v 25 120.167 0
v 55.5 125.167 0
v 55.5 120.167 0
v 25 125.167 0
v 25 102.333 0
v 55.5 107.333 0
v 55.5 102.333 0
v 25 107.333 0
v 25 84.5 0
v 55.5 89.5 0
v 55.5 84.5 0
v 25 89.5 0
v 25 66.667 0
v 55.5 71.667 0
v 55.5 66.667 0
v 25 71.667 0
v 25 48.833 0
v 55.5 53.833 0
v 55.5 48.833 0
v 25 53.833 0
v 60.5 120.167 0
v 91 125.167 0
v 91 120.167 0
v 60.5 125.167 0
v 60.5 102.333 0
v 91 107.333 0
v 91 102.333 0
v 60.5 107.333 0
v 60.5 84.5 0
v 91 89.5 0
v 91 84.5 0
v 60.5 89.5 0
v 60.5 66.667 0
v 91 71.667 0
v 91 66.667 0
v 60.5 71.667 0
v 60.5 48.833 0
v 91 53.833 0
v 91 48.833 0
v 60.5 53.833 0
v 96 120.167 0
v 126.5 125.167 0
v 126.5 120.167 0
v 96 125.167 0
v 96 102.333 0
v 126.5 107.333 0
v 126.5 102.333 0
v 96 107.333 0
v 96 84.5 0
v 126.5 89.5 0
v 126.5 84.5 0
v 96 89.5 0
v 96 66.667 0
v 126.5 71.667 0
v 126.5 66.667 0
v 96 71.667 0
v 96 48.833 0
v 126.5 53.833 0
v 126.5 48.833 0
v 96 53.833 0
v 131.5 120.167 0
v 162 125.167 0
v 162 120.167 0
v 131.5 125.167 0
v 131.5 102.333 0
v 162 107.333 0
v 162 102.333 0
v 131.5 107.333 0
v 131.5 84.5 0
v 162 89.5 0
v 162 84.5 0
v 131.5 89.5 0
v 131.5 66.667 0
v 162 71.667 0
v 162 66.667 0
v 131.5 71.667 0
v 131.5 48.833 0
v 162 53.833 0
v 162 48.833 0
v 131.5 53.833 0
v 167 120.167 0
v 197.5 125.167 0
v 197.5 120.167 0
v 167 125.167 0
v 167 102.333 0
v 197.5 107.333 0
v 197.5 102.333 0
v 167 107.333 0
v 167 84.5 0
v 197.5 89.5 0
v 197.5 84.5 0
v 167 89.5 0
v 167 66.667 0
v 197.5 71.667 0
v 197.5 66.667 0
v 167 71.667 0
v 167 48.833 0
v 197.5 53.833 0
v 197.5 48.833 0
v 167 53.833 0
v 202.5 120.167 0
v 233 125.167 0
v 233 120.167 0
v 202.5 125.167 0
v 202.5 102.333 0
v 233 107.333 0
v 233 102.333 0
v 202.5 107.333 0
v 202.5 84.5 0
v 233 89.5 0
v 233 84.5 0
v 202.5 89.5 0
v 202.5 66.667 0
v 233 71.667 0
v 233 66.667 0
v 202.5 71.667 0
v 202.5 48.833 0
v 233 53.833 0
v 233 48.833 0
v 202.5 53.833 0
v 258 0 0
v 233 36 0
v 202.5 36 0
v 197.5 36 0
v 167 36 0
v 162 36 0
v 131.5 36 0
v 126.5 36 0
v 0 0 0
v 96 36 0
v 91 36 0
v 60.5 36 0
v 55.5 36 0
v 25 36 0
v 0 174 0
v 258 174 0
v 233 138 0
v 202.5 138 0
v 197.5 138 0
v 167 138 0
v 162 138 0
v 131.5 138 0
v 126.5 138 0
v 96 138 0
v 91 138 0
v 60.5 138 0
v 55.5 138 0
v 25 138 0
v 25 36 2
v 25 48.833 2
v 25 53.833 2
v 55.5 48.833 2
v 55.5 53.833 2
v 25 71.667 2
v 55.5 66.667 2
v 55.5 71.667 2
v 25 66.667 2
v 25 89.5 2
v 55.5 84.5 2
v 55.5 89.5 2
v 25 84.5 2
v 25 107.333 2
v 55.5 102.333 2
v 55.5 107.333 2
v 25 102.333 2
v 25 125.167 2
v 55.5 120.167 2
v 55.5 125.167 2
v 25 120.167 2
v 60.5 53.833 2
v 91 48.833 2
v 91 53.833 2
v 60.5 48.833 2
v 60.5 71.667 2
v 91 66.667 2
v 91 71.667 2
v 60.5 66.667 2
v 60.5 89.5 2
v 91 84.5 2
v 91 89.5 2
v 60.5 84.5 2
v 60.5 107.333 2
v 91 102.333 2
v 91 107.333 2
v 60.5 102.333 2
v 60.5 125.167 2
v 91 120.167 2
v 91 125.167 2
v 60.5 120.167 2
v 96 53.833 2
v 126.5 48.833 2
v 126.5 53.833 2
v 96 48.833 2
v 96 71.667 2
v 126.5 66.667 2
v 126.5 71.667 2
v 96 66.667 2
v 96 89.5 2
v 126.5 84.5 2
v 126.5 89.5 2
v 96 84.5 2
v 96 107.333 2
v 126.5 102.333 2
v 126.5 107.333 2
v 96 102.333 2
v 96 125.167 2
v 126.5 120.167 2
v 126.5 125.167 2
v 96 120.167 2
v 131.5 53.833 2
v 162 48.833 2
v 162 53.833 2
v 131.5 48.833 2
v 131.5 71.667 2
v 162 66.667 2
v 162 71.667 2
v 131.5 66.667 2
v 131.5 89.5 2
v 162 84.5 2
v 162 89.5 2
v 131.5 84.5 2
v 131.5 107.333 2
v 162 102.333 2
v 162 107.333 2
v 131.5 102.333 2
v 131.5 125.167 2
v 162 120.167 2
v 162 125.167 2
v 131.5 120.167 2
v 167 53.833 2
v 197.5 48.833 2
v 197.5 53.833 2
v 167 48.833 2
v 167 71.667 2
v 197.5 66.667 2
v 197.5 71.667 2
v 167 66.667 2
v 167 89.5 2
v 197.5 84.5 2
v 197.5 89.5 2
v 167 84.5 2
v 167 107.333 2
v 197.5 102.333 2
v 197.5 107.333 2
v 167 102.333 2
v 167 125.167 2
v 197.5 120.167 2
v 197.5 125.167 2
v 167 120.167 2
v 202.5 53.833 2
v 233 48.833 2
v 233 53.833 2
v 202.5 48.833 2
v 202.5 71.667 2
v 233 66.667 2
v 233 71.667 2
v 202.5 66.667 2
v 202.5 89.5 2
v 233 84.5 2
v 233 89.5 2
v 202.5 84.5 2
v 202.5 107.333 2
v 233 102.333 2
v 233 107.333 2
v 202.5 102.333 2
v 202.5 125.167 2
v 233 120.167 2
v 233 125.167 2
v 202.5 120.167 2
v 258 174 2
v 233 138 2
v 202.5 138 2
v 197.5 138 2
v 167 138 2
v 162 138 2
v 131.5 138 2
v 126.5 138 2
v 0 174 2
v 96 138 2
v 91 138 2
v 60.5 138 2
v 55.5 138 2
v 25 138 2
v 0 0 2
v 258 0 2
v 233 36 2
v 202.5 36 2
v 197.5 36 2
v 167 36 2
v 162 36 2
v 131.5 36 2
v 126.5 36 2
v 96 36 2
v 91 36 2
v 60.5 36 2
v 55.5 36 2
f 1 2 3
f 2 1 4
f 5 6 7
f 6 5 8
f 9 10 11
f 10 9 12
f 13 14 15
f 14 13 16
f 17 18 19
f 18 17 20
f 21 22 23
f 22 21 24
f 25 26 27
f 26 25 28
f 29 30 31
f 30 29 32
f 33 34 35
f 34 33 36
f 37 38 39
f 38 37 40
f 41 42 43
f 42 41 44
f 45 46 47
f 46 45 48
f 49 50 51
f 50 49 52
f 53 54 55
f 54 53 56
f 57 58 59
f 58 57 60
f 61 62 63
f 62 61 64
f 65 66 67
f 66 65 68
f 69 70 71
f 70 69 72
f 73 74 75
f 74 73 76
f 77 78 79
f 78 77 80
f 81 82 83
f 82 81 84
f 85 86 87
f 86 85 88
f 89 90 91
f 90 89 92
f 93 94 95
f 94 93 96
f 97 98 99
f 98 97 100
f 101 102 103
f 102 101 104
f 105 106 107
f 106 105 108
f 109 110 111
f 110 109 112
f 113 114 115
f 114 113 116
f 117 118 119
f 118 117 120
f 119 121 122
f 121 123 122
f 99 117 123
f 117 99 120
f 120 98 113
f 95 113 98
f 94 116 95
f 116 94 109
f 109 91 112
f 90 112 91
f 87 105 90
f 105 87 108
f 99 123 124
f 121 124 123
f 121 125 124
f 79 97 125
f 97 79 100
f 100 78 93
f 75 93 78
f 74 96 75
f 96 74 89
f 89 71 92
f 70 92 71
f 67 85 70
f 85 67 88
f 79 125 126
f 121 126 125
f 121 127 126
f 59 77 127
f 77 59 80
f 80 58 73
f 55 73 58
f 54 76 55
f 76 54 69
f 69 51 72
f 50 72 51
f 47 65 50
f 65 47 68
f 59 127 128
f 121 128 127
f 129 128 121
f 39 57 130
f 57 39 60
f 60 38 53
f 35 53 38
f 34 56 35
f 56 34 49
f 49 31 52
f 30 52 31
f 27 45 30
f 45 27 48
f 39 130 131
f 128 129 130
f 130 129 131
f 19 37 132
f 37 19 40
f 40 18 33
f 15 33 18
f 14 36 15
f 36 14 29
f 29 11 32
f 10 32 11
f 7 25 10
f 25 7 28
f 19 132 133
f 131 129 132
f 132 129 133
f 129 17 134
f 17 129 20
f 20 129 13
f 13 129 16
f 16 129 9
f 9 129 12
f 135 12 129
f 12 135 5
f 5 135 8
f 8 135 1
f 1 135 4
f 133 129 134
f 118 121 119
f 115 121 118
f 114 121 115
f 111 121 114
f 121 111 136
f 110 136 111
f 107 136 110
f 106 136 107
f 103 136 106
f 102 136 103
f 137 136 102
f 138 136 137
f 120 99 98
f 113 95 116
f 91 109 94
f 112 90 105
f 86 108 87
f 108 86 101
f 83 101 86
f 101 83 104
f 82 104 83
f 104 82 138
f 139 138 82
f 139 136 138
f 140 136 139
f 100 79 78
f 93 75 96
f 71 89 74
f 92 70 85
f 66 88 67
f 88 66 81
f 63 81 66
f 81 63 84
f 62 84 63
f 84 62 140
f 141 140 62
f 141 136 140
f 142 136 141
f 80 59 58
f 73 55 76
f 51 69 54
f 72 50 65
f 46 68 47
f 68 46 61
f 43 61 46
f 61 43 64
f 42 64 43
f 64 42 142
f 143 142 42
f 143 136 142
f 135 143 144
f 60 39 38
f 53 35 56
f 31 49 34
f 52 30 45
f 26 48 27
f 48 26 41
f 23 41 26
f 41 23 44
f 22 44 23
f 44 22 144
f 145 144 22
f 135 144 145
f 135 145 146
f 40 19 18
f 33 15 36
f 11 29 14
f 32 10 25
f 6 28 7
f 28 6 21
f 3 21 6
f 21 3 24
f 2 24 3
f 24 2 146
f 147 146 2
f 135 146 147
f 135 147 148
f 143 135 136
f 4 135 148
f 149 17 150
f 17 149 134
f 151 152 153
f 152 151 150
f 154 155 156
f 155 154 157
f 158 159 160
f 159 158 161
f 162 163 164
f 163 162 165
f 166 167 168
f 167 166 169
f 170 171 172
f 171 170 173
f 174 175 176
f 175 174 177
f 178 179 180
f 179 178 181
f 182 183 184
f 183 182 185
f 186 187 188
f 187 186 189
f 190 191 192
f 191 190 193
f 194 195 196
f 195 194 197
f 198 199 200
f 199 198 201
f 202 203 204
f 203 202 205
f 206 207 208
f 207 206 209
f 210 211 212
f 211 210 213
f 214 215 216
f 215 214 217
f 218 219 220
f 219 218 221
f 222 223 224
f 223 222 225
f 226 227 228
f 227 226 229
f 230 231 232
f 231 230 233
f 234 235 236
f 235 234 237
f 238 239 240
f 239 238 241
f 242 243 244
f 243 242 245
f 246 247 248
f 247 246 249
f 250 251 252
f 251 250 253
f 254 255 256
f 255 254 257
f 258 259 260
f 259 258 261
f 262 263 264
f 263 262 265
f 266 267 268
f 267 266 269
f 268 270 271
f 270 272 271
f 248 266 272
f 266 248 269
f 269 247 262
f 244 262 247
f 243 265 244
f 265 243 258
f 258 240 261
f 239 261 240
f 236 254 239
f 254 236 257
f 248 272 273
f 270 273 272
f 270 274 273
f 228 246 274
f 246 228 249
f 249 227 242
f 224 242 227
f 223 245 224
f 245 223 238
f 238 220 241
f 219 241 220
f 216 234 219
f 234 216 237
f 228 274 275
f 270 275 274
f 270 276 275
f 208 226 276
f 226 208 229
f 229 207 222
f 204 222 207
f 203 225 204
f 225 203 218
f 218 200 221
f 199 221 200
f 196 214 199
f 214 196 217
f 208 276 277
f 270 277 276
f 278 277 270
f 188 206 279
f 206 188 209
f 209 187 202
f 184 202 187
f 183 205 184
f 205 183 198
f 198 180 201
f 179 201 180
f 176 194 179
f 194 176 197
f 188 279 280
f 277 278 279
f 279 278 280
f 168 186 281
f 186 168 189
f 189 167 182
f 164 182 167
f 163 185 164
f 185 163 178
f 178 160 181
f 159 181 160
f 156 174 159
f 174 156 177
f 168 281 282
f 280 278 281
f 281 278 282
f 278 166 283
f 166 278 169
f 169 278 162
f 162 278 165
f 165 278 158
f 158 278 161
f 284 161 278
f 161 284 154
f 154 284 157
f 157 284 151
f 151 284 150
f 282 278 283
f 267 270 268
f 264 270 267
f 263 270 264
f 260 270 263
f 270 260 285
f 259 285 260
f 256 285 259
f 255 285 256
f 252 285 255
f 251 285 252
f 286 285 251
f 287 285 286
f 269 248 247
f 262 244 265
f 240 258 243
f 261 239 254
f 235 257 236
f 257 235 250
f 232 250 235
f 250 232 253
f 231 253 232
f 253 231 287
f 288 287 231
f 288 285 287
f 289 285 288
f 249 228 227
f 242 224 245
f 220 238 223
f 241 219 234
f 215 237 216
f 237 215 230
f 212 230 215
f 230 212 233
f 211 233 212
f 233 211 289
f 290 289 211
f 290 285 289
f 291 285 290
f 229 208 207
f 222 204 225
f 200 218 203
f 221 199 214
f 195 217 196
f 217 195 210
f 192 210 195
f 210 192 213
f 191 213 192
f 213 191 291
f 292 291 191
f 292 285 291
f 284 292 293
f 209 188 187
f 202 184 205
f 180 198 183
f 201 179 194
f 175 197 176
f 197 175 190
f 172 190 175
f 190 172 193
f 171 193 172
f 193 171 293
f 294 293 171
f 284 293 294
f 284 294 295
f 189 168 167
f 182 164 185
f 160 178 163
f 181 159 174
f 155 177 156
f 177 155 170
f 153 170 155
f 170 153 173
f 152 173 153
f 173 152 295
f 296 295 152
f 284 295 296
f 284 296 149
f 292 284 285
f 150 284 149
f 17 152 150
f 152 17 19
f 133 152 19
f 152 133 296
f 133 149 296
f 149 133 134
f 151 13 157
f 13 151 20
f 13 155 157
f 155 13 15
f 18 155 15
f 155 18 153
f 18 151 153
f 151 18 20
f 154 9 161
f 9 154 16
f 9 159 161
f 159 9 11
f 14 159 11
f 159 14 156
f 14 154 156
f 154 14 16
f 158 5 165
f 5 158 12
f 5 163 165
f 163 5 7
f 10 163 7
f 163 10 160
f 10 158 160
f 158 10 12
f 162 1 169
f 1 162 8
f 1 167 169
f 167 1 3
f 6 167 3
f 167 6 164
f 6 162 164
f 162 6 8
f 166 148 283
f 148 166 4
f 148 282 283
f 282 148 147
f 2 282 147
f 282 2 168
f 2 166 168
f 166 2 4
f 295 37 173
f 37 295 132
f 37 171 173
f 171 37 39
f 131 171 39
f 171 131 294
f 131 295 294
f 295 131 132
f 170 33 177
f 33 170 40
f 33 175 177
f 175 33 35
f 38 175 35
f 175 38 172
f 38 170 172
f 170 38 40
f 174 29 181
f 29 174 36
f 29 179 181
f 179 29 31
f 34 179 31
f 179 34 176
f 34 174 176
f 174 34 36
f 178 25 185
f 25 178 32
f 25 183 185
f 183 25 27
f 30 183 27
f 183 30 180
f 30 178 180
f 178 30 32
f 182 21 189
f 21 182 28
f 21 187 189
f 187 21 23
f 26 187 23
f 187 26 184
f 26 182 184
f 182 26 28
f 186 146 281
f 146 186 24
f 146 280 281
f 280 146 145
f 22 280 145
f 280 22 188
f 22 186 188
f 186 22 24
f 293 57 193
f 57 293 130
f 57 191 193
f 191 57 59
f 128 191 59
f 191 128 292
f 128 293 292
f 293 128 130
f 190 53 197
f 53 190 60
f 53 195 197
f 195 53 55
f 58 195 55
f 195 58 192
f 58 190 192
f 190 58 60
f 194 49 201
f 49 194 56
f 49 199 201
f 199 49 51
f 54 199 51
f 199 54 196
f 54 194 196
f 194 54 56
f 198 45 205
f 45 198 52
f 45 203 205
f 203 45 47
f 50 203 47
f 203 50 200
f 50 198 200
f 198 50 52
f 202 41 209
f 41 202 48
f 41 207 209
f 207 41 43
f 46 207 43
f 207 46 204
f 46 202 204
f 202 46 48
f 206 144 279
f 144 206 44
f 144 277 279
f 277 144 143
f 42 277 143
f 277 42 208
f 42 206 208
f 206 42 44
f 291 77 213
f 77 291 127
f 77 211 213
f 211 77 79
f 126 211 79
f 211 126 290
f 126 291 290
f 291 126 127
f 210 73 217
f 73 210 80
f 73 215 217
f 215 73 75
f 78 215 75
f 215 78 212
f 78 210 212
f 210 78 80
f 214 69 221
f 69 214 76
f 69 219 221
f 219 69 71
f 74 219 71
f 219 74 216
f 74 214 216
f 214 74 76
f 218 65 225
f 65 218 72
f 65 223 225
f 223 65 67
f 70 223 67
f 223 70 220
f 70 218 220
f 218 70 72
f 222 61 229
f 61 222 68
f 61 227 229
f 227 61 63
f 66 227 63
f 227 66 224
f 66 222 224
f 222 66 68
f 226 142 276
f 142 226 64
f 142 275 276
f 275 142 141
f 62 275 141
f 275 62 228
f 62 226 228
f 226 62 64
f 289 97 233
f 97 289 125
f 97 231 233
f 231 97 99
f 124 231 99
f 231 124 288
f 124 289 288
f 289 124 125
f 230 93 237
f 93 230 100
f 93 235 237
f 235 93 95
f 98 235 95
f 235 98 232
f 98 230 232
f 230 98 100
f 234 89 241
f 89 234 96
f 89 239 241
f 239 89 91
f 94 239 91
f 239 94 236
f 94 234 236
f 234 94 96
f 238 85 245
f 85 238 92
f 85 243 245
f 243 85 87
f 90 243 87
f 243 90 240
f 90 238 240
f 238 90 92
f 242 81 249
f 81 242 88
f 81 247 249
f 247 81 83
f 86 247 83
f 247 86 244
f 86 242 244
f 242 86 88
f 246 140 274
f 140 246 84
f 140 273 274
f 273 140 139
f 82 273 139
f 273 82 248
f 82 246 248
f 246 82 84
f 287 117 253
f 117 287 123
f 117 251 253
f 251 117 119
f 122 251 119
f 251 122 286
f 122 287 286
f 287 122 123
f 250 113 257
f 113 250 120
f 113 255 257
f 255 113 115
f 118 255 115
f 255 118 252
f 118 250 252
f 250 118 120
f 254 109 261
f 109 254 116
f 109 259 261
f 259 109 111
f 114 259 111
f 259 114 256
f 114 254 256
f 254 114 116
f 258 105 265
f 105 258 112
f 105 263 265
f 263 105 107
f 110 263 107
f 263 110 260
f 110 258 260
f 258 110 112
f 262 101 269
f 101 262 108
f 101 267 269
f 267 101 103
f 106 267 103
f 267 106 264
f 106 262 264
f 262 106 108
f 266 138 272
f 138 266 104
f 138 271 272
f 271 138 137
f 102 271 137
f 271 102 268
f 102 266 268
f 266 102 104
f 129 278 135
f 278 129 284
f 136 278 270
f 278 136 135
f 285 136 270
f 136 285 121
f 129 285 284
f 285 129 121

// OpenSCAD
// [FL_INDEX: keywords="openscad, 3d_parametric, Accessible_keyboard, csg_solid" | COT="Parametric OpenSCAD design from 3DCodeverse"]
// Title: Accessible keyboard

//Overall width (left-right) distance (in mm)
total_width = 258; //[40:400]
// Overall height (top-bottom) distance (in mm)
total_height = 174; // [50:300]
// Thickness of the sheet 
thickness = 2; // [0.5:5]
// Number of columns
number_columns = 6; // [1:15]
// Number of rows
number_rows = 6; // [1:15]
// Left margin (distance from left side of sheet to the first button, in mm)
left_margin = 25; // [0:50]
// Right margin (distance from right side of sheet to the first button, in mm)
right_margin = 25; // [0:50]
// Top margin (distance from top of sheet to the first button, in mm)
top_margin = 36; // [0:50]
// Bottom margin (distance from bottom of sheet to the last button, in mm)
bottom_margin = 36; // [0:50]
// Distance between the right edge of one button and the left edge of the next (in mm)
horizontal_gap = 5; // [2:30]
// Distance between the bottom edge of one button and the top edge of the next (in mm)
vertical_gap = 5; // [2:30]

module makebuttons(number_columns,number_rows,left_margin,top_margin,button_width,button_height,horizontal_gap,vertical_gap) {

for ( i = [0 : number_columns-1] )
{
	for (j = [0 : number_rows-1])
    translate([left_margin + i * (button_width + horizontal_gap), top_margin + j * (button_height + vertical_gap), 0])
	linear_extrude(height=thickness)
   square([button_width,button_height]);
}

}

button_height = (total_height - top_margin - bottom_margin - (number_rows-1)*vertical_gap ) / number_rows;

button_width = (total_width - left_margin - right_margin - (number_columns-1)*horizontal_gap ) / number_columns;

difference() {
linear_extrude(height = thickness)
square([total_width,total_height]);

makebuttons(number_columns,number_rows,left_margin,top_margin,button_width,button_height,horizontal_gap,vertical_gap);
}
